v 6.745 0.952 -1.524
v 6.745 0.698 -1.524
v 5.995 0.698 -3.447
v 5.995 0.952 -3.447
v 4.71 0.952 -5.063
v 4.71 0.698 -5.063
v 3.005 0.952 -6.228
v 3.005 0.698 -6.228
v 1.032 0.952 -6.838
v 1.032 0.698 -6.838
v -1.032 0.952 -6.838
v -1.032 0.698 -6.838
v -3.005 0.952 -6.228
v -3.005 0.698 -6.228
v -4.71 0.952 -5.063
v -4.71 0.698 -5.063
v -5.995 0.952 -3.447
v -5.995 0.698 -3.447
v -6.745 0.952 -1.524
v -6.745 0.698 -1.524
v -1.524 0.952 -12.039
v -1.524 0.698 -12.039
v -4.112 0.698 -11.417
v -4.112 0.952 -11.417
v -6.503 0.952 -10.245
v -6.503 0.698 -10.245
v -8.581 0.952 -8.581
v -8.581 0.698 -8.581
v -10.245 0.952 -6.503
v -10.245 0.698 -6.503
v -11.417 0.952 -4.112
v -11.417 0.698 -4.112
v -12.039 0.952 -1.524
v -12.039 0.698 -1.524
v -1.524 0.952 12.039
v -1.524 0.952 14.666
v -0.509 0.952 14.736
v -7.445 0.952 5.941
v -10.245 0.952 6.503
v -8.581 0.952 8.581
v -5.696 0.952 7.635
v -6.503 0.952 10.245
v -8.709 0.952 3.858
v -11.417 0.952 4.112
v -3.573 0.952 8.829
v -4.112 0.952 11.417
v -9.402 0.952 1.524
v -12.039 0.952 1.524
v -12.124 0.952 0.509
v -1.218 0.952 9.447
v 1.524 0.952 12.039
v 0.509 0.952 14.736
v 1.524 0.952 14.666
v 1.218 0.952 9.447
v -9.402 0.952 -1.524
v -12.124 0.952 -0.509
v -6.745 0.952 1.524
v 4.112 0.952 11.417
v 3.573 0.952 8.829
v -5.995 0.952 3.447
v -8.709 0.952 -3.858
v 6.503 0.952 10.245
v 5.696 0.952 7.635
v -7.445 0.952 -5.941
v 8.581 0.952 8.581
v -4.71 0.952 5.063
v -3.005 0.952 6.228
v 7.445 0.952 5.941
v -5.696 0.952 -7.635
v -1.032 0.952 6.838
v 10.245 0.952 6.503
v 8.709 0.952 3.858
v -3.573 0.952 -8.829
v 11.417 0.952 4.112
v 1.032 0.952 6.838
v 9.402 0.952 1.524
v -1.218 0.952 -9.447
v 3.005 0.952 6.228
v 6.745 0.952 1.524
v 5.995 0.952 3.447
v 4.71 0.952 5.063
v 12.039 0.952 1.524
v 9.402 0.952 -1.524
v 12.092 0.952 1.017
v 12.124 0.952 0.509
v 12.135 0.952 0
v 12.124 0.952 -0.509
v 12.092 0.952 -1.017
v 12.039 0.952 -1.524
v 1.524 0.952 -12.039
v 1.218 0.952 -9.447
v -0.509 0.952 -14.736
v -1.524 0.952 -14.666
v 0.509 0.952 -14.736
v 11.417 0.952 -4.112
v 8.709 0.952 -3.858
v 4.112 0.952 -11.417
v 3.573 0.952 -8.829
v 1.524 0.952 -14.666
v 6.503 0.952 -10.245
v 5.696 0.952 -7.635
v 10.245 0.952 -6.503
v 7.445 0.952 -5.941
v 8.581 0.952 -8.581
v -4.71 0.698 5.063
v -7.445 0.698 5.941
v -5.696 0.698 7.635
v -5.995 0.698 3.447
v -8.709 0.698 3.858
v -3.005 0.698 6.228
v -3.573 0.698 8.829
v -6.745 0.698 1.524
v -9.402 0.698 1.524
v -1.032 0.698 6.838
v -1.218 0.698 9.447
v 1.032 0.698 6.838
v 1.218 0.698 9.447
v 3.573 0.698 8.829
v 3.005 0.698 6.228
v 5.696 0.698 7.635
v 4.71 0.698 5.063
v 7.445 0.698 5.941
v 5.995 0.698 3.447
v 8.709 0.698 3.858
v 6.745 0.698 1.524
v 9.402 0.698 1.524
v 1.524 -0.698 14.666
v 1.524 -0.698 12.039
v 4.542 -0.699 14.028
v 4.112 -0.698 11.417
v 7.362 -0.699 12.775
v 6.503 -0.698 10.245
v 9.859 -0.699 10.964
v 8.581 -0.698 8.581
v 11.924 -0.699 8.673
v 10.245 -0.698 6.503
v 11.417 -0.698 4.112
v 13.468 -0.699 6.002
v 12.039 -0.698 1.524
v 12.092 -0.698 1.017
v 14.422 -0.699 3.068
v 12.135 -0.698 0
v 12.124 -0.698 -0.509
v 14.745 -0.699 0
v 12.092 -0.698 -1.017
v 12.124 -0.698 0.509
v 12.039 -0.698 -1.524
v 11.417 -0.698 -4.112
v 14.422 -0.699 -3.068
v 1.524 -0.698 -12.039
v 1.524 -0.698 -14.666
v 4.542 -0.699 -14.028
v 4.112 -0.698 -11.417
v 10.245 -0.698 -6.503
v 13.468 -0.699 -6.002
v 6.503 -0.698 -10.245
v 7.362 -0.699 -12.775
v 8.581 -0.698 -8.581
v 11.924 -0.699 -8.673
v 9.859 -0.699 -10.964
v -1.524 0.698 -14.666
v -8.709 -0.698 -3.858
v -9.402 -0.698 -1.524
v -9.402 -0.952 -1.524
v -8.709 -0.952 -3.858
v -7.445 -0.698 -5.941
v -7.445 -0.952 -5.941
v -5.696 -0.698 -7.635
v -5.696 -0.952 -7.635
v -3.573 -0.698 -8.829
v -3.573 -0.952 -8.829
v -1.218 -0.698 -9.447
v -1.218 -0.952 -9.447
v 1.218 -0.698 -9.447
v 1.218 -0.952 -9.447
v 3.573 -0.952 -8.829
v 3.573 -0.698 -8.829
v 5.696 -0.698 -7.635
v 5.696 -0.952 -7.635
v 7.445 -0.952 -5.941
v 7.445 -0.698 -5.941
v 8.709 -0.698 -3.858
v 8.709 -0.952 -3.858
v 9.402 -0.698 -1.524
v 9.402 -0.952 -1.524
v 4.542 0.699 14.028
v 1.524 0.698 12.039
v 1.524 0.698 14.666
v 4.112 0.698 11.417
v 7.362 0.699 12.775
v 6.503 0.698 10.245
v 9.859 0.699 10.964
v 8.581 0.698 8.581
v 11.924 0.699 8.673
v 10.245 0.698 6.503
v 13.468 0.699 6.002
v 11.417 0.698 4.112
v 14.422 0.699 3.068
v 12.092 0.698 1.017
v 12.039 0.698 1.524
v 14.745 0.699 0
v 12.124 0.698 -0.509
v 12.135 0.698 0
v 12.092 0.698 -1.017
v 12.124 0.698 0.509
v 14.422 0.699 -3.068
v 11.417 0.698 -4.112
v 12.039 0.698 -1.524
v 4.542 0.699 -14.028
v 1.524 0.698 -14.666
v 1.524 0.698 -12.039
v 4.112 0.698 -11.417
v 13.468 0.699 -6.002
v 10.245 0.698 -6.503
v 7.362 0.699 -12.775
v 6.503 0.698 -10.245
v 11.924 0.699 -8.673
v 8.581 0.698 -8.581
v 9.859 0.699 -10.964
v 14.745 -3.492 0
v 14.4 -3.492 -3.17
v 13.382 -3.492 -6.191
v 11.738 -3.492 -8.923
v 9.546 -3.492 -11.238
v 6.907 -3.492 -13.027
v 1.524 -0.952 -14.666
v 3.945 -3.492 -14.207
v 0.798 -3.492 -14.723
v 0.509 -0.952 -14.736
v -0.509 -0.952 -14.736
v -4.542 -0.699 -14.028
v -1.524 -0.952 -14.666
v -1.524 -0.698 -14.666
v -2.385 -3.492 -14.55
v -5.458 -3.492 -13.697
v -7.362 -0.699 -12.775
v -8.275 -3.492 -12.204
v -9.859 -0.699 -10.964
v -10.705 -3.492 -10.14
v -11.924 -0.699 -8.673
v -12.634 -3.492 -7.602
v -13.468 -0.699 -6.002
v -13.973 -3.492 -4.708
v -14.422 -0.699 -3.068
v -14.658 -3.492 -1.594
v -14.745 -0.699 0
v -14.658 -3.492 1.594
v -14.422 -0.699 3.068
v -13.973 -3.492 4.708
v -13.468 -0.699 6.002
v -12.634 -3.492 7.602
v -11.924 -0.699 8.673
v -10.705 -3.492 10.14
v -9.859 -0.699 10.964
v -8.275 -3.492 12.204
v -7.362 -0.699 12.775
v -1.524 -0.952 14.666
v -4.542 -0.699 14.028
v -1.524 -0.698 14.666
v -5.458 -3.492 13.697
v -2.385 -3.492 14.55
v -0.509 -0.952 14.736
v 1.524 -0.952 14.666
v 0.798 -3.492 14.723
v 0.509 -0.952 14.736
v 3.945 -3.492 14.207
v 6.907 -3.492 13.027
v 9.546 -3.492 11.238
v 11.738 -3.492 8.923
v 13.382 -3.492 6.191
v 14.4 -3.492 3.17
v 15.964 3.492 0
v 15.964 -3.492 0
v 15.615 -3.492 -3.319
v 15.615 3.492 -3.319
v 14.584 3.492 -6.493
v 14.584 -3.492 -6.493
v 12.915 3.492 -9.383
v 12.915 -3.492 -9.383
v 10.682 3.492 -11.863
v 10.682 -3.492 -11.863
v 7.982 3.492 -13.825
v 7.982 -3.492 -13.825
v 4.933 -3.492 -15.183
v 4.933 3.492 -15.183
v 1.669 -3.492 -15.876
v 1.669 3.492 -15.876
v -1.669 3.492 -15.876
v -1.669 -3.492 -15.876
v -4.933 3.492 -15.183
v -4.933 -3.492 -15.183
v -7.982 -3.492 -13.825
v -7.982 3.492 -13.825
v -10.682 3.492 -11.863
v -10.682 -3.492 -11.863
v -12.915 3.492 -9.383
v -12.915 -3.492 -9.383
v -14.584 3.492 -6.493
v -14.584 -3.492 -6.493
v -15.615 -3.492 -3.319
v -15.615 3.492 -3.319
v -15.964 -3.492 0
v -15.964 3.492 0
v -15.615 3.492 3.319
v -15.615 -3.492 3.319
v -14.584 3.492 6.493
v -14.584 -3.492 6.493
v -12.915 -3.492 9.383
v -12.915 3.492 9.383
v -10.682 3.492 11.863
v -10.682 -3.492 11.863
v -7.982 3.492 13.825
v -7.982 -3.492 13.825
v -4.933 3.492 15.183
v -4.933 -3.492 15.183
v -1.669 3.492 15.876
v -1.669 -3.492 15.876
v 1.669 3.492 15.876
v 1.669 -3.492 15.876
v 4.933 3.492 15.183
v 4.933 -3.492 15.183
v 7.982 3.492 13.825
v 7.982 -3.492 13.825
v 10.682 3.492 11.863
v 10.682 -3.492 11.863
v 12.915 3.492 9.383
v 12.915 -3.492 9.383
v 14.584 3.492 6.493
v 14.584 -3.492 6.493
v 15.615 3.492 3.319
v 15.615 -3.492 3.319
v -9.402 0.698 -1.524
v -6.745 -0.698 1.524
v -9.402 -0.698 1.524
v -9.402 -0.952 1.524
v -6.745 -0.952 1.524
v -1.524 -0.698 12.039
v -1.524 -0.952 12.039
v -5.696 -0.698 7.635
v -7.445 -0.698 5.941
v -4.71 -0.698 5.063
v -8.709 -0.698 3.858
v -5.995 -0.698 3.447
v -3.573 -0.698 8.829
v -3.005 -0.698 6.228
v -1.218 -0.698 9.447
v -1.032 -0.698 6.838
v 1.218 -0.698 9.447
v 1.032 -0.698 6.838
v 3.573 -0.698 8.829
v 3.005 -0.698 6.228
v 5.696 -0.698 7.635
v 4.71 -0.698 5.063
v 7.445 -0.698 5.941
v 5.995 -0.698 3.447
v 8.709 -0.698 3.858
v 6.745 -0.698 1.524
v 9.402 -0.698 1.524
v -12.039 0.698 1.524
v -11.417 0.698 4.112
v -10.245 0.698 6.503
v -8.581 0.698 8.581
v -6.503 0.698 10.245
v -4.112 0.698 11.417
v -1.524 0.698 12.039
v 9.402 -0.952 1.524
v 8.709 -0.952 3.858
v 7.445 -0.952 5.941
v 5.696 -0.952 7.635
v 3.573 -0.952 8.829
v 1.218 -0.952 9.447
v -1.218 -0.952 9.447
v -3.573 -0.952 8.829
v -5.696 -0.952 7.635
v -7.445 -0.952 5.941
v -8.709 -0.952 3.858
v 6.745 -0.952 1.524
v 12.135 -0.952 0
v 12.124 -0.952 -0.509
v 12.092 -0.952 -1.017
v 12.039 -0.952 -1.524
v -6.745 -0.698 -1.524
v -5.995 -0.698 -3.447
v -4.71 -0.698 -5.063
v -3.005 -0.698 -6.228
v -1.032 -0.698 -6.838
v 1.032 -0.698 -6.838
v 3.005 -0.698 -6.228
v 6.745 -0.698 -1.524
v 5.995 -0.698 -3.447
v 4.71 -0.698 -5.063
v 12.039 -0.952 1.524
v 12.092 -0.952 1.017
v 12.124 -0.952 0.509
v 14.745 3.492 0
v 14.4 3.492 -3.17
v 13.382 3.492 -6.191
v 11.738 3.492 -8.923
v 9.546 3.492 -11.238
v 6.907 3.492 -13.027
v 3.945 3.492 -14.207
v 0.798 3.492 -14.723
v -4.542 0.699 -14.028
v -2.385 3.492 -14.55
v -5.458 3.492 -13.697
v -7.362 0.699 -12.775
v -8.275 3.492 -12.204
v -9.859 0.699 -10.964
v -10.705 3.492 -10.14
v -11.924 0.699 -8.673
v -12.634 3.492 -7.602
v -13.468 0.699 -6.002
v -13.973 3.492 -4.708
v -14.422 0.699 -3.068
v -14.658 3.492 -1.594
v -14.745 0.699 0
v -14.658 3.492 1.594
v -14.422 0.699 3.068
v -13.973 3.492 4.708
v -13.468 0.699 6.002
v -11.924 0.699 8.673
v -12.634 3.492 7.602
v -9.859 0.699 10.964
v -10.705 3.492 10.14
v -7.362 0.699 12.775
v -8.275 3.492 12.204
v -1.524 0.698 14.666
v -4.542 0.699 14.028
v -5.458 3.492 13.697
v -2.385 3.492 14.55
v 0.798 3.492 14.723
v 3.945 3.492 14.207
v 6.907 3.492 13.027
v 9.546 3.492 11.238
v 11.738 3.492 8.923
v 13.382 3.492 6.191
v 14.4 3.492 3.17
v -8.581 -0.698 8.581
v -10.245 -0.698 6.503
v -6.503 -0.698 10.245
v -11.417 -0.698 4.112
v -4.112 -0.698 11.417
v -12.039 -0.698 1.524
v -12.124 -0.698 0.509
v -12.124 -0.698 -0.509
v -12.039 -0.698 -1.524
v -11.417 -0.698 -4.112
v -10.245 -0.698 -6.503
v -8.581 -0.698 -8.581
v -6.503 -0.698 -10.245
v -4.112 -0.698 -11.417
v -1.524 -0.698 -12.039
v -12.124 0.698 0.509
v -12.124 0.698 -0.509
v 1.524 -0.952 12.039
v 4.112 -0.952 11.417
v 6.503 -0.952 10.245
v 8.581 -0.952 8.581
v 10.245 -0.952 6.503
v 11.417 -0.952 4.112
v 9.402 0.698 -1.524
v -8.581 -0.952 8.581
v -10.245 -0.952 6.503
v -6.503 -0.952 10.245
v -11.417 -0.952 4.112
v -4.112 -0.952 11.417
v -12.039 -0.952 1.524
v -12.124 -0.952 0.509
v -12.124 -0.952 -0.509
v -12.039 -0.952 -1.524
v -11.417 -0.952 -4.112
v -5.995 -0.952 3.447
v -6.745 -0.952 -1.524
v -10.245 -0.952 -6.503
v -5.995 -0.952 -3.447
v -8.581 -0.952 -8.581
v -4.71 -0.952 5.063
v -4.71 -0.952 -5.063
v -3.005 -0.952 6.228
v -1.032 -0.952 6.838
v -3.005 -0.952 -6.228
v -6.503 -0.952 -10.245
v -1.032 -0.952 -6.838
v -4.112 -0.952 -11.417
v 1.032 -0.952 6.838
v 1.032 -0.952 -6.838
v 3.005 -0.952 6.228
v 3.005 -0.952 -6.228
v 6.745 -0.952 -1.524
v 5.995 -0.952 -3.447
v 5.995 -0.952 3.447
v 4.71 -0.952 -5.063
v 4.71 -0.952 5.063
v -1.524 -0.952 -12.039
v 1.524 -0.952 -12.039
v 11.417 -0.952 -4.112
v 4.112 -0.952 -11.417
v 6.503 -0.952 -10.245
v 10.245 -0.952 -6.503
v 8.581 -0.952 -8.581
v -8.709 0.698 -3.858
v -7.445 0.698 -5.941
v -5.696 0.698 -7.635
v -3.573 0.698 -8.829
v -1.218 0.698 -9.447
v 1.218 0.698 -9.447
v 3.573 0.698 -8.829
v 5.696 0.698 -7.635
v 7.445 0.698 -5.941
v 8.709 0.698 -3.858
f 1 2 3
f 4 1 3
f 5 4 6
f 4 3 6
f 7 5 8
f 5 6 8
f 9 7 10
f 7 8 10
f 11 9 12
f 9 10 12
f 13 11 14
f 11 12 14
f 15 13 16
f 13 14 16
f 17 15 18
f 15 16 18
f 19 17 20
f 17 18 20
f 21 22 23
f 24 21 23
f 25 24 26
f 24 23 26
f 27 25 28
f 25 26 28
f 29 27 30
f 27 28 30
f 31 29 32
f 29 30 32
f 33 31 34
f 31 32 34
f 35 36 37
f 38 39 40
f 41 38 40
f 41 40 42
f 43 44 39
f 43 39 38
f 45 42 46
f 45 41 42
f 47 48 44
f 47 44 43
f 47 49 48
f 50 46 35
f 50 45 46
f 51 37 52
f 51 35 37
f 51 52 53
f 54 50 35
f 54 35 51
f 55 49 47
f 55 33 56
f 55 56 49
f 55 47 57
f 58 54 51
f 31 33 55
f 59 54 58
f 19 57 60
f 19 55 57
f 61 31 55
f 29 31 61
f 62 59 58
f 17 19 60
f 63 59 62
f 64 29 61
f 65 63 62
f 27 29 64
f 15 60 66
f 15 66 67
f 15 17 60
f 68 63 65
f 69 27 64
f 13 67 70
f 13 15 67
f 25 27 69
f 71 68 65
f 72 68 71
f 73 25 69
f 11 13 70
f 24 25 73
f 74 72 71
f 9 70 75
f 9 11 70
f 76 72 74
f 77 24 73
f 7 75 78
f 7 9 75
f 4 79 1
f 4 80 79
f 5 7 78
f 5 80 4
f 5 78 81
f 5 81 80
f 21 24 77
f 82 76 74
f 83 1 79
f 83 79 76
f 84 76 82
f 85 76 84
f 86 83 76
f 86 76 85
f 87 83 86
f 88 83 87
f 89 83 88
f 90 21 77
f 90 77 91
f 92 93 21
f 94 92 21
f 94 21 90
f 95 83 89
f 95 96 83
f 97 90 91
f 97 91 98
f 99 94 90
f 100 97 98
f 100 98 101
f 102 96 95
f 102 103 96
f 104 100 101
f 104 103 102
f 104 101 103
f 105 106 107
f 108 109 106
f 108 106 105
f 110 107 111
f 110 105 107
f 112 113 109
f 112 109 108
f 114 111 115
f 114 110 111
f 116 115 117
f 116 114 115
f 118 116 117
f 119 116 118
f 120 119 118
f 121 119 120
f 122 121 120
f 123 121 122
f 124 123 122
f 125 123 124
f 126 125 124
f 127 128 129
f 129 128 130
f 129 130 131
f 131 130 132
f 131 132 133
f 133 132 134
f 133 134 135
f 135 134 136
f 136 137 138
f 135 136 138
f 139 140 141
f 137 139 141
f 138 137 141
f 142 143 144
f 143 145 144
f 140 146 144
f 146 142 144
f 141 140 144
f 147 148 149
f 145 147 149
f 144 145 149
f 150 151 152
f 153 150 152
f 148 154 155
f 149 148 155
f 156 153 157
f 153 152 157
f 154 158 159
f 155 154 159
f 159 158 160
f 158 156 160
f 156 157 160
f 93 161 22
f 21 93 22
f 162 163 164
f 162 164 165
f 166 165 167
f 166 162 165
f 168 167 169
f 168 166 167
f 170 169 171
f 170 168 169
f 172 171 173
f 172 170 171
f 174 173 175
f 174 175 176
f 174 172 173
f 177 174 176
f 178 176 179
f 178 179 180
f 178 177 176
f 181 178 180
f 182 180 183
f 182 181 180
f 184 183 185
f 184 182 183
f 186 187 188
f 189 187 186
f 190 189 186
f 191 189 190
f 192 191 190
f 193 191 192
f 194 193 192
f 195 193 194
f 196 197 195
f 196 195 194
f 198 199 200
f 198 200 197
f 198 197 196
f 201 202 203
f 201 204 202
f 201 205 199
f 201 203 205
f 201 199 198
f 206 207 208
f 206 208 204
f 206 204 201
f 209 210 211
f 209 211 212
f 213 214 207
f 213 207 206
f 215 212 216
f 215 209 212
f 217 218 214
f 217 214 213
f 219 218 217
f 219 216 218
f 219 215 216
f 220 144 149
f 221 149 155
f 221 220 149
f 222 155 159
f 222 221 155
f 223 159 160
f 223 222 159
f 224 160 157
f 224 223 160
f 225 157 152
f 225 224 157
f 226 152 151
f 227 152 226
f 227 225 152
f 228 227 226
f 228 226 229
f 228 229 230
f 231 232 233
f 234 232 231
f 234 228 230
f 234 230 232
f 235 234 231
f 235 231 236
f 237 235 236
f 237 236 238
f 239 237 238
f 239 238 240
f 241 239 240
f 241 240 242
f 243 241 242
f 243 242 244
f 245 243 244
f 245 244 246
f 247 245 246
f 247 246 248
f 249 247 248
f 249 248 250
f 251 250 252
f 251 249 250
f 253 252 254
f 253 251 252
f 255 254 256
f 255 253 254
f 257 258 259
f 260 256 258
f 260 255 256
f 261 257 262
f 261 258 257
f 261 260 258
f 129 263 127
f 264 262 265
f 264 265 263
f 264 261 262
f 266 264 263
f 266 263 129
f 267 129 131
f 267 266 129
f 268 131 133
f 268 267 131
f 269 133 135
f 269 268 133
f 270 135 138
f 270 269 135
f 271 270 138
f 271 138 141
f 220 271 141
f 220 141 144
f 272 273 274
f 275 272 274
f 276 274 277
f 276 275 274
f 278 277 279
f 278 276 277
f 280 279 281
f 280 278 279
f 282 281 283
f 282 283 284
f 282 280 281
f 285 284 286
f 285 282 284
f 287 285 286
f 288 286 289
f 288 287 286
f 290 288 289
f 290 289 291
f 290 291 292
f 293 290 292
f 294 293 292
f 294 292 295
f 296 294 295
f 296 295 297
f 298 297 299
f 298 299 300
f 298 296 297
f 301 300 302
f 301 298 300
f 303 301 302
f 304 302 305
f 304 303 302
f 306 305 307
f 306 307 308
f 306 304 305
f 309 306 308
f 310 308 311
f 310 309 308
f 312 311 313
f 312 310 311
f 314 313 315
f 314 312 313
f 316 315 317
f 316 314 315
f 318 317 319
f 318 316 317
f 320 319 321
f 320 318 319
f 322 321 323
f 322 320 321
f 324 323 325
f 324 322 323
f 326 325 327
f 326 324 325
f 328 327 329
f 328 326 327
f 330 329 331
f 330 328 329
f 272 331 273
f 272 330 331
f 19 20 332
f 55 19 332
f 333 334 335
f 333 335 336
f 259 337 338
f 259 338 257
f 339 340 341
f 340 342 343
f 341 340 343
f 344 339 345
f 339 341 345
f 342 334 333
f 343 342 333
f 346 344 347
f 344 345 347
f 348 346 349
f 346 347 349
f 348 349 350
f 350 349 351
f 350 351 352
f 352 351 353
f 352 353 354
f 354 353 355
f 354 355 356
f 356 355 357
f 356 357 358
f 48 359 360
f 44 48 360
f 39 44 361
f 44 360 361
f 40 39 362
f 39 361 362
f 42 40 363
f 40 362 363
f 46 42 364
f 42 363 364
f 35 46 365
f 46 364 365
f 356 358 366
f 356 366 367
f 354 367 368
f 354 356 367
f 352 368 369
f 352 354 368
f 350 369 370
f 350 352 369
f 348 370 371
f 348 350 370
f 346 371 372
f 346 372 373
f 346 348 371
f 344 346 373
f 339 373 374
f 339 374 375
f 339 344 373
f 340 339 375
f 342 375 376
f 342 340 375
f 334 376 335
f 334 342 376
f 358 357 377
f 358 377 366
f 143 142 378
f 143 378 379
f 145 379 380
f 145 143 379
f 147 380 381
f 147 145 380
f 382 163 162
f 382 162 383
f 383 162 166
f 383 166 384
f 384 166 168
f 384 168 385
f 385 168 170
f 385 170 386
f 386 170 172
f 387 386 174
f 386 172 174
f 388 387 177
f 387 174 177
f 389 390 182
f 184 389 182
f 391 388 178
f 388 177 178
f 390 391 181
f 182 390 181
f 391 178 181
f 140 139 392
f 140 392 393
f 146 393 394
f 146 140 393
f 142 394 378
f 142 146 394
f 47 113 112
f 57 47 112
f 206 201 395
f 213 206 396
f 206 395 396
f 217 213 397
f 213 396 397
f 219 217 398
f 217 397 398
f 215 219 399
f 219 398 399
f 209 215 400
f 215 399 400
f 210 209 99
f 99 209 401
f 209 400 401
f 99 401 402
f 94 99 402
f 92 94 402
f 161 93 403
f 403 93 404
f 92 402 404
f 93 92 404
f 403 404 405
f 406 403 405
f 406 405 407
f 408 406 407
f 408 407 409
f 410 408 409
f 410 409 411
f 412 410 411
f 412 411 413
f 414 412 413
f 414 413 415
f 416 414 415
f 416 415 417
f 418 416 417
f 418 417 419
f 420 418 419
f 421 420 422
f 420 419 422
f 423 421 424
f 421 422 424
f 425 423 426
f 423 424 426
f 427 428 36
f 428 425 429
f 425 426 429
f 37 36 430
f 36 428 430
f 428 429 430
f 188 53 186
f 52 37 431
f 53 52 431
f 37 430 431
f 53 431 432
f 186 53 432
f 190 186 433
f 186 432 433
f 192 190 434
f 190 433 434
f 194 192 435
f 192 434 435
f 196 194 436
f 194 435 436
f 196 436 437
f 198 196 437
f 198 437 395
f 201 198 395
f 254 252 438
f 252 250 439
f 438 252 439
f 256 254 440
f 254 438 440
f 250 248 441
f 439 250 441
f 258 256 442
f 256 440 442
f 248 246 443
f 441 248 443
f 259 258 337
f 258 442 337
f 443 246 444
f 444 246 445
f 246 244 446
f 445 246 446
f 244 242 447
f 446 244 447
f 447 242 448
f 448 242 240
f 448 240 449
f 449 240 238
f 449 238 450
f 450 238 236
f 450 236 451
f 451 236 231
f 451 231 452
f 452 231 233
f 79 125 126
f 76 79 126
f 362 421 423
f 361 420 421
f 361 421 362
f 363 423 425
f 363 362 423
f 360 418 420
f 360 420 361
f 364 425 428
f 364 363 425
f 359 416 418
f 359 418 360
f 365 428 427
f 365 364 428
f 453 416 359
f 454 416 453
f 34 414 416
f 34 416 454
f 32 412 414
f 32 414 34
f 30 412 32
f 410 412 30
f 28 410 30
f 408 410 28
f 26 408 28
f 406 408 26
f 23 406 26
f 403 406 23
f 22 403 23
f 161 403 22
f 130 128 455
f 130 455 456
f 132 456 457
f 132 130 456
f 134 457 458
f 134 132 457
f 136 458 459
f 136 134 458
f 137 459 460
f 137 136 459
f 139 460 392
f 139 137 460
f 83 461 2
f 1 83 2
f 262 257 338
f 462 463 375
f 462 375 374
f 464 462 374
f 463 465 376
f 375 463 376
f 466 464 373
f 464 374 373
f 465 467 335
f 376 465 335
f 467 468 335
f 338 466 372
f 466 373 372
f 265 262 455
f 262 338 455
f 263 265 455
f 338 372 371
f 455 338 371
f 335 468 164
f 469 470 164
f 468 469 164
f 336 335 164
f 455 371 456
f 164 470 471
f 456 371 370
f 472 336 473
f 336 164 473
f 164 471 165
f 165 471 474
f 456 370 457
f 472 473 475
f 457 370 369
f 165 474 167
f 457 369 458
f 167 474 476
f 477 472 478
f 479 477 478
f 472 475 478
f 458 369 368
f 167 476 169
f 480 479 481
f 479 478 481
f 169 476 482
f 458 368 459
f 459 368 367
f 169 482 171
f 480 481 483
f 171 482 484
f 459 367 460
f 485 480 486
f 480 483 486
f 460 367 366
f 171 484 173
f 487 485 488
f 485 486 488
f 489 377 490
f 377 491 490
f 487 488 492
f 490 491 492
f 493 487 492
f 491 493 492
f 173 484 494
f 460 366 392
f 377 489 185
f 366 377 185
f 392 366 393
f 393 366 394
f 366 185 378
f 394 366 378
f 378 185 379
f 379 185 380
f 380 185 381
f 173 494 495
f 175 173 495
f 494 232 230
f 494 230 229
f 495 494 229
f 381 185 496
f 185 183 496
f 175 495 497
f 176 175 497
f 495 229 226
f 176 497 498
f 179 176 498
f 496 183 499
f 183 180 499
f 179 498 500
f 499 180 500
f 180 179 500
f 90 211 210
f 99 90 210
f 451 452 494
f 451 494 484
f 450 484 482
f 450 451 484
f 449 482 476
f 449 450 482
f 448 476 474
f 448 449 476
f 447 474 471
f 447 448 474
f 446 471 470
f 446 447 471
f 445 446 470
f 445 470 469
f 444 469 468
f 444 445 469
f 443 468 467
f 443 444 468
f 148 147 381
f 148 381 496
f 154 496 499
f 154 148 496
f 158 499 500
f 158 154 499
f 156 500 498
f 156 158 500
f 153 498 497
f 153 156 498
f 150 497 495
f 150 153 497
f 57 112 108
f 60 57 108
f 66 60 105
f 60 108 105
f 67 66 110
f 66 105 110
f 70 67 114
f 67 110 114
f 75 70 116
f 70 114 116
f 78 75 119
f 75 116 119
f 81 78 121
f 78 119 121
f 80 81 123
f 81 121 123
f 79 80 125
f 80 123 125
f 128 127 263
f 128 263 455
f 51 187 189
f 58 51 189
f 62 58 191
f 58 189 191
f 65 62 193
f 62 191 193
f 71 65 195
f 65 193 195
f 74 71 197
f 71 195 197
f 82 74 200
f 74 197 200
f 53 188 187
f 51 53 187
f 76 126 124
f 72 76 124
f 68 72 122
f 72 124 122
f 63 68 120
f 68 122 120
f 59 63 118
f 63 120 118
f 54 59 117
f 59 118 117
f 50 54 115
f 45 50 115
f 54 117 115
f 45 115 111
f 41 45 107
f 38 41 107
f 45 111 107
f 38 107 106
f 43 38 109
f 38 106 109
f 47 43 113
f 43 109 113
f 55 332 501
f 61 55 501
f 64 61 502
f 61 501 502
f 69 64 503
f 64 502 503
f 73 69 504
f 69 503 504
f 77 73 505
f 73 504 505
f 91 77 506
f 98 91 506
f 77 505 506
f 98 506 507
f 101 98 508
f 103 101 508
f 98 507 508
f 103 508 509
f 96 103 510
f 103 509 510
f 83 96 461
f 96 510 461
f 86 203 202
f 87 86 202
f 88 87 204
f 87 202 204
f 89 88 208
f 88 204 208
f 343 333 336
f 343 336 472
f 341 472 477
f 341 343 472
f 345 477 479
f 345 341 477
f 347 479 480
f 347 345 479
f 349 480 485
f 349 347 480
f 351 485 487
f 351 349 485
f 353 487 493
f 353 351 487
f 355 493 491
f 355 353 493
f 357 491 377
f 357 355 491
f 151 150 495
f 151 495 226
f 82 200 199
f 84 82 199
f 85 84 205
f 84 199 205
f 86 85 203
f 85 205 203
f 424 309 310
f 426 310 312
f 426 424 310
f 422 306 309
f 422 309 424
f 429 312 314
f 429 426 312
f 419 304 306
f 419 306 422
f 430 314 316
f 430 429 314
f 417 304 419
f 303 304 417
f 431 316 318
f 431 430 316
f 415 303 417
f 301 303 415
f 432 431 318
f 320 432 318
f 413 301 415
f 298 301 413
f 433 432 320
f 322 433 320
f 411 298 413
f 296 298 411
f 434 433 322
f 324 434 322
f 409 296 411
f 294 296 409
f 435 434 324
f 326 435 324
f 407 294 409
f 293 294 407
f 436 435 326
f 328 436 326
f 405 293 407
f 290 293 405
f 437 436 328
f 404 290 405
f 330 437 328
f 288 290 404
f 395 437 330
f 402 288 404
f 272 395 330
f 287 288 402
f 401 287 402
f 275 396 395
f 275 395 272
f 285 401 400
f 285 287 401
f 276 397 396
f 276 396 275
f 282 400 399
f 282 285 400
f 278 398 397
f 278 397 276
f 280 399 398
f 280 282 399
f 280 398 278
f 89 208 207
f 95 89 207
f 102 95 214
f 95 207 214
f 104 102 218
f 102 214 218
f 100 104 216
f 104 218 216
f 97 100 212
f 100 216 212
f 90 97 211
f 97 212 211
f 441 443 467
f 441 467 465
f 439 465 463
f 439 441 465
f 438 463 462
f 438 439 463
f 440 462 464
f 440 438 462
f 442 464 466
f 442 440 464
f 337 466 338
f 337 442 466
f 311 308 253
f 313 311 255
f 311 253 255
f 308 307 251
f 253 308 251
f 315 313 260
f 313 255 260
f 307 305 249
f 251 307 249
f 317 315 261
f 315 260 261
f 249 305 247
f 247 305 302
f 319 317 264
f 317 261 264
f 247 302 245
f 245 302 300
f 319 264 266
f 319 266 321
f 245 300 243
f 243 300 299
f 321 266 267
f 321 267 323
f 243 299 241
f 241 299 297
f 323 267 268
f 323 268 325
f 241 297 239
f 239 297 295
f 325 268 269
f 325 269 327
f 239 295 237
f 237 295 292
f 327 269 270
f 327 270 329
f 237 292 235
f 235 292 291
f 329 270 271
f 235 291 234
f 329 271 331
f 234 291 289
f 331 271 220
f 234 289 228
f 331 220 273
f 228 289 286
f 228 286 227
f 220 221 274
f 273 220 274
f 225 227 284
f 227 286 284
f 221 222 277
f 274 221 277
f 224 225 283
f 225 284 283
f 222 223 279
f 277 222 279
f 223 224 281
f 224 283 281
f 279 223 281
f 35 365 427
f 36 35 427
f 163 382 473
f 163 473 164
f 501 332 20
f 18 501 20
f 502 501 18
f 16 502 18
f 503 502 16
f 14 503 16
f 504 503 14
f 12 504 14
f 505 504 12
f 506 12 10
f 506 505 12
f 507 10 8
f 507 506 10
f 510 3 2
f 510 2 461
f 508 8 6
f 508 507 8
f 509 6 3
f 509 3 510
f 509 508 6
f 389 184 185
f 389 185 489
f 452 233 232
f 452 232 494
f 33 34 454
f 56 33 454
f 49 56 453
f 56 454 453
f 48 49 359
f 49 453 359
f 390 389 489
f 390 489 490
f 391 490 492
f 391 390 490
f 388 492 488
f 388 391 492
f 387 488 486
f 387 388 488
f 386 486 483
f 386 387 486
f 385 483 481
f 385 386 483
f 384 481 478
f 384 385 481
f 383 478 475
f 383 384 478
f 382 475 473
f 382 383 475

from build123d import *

# Parameters (mm, degrees)
SKETCH1_R           = 15.9639
BOSS_EXTRUDE1_DEPTH = 3.4925
SKETCH2_R           = 14.7447
CUT_EXTRUDE1_DEPTH  = 2.794
BOSS_EXTRUDE2_DEPTH = 0.254


with BuildPart() as part:
    # Sketch1 → Boss-Extrude1 (new body, symmetric)
    with BuildSketch(Plane(origin=(0, 0, 0), x_dir=(1, 0, 0), z_dir=(0, 1, 0))):
        Circle(SKETCH1_R)
    extrude(amount=BOSS_EXTRUDE1_DEPTH, both=True)

    # Sketch2 → Cut-Extrude1 (cut)
    with BuildSketch(Plane(origin=(0, 3.4925, 0), x_dir=(1, 0, 0), z_dir=(0, 1, 0))):
        Circle(SKETCH2_R)
    cut_extrude1 = extrude(amount=-CUT_EXTRUDE1_DEPTH, mode=Mode.SUBTRACT)

    # Sketch3 → Boss-Extrude2 (add)
    with BuildSketch(Plane(origin=(0, 0.6985, 0), x_dir=(1, 0, 0), z_dir=(0, 1, 0))):
        with BuildLine():
            ThreePointArc((6.745125909, 1.524), (0, 6.91515), (-6.745125909, 1.524))
            Line((-6.745125909, 1.524), (-6.745125909, -1.524))
            ThreePointArc((-6.745125909, -1.524), (0, -6.91515), (6.745125909, -1.524))
            Line((6.745125909, -1.524), (6.745125909, 1.524))
        make_face()
        with BuildLine():
            ThreePointArc((-12.038771055, -1.524), (-8.580634724, -8.580634724), (-1.524, -12.038771055))
            Line((-1.524, -12.038771055), (1.524, -12.038771055))
            ThreePointArc((1.524, -12.038771055), (8.580634724, -8.580634724), (12.038771055, -1.524))
            Line((12.038771055, -1.524), (9.402289562, -1.524))
            ThreePointArc((9.402289562, -1.524), (0, -9.525), (-9.402289562, -1.524))
            Line((-9.402289562, -1.524), (-12.038771055, -1.524))
        make_face()
        with BuildLine():
            Line((1.524, 12.038771055), (-1.524, 12.038771055))
            ThreePointArc((-1.524, 12.038771055), (-8.580634724, 8.580634724), (-12.038771055, 1.524))
            Line((-12.038771055, 1.524), (-9.402289562, 1.524))
            ThreePointArc((-9.402289562, 1.524), (0, 9.525), (9.402289562, 1.524))
            Line((9.402289562, 1.524), (12.038771055, 1.524))
            ThreePointArc((12.038771055, 1.524), (8.580634724, 8.580634724), (1.524, 12.038771055))
        make_face()
        with BuildLine():
            ThreePointArc((1.524, 14.665728829), (0, 14.7447), (-1.524, 14.665728829))
            Line((-1.524, 14.665728829), (-1.524, 12.038771055))
            ThreePointArc((-1.524, 12.038771055), (0, 12.13485), (1.524, 12.038771055))
            Line((1.524, 12.038771055), (1.524, 14.665728829))
        make_face()
        with BuildLine():
            Line((-6.745125909, 1.524), (-9.402289562, 1.524))
            ThreePointArc((-9.402289562, 1.524), (-9.525, 0), (-9.402289562, -1.524))
            Line((-9.402289562, -1.524), (-6.745125909, -1.524))
            ThreePointArc((-6.745125909, -1.524), (-6.91515, 0), (-6.745125909, 1.524))
        make_face()
        with BuildLine():
            ThreePointArc((9.525, 0), (9.494272828, 0.764466129), (9.402289562, 1.524))
            Line((9.402289562, 1.524), (6.745125909, 1.524))
            ThreePointArc((6.745125909, 1.524), (6.87251253, 0.766727493), (6.91515, 0))
            ThreePointArc((6.91515, 0), (6.87251253, -0.766727493), (6.745125909, -1.524))
            Line((6.745125909, -1.524), (9.402289562, -1.524))
            ThreePointArc((9.402289562, -1.524), (9.494272828, -0.764466129), (9.525, 0))
        make_face()
        with BuildLine():
            Line((-1.524, -12.038771055), (-1.524, -14.665728829))
            ThreePointArc((-1.524, -14.665728829), (0, -14.7447), (1.524, -14.665728829))
            Line((1.524, -14.665728829), (1.524, -12.038771055))
            ThreePointArc((1.524, -12.038771055), (0, -12.13485), (-1.524, -12.038771055))
        make_face()
        with BuildLine():
            Line((-9.402289562, 1.524), (-12.038771055, 1.524))
            Line((-12.038771055, 1.524), (-12.038771055, -1.524))
            Line((-12.038771055, -1.524), (-9.402289562, -1.524))
            ThreePointArc((-9.402289562, -1.524), (-9.525, 0), (-9.402289562, 1.524))
        make_face()
        with BuildLine():
            Line((12.038771055, -1.524), (12.038771055, 1.524))
            Line((12.038771055, 1.524), (9.402289562, 1.524))
            ThreePointArc((9.402289562, 1.524), (9.494272828, 0.764466129), (9.525, 0))
            ThreePointArc((9.525, 0), (9.494272828, -0.764466129), (9.402289562, -1.524))
            Line((9.402289562, -1.524), (12.038771055, -1.524))
        make_face()
        with BuildLine():
            ThreePointArc((12.13485, 0), (12.110806444, 0.763512797), (12.038771055, 1.524))
            Line((12.038771055, 1.524), (12.038771055, -1.524))
            ThreePointArc((12.038771055, -1.524), (12.110806444, -0.763512797), (12.13485, 0))
        make_face()
        with BuildLine():
            ThreePointArc((6.91515, 0), (6.87251253, 0.766727493), (6.745125909, 1.524))
            Line((6.745125909, 1.524), (6.745125909, -1.524))
            ThreePointArc((6.745125909, -1.524), (6.87251253, -0.766727493), (6.91515, 0))
        make_face()
        with BuildLine():
            Line((-6.745125909, -1.524), (-6.745125909, 1.524))
            ThreePointArc((-6.745125909, 1.524), (-6.91515, 0), (-6.745125909, -1.524))
        make_face()
        with BuildLine():
            Line((-12.038771055, -1.524), (-12.038771055, 1.524))
            ThreePointArc((-12.038771055, 1.524), (-12.13485, 0), (-12.038771055, -1.524))
        make_face()
        with BuildLine():
            Line((1.524, -12.038771055), (-1.524, -12.038771055))
            ThreePointArc((-1.524, -12.038771055), (0, -12.13485), (1.524, -12.038771055))
        make_face()
        with BuildLine():
            ThreePointArc((1.524, 12.038771055), (0, 12.13485), (-1.524, 12.038771055))
            Line((-1.524, 12.038771055), (1.524, 12.038771055))
        make_face()
    boss_extrude2 = extrude(amount=BOSS_EXTRUDE2_DEPTH)

    # Mirror1: Cut-Extrude1, Boss-Extrude2 across plane
    add(cut_extrude1.mirror(Plane.ZX), mode=Mode.SUBTRACT)
    add(boss_extrude2.mirror(Plane.ZX))


solid = part.part
